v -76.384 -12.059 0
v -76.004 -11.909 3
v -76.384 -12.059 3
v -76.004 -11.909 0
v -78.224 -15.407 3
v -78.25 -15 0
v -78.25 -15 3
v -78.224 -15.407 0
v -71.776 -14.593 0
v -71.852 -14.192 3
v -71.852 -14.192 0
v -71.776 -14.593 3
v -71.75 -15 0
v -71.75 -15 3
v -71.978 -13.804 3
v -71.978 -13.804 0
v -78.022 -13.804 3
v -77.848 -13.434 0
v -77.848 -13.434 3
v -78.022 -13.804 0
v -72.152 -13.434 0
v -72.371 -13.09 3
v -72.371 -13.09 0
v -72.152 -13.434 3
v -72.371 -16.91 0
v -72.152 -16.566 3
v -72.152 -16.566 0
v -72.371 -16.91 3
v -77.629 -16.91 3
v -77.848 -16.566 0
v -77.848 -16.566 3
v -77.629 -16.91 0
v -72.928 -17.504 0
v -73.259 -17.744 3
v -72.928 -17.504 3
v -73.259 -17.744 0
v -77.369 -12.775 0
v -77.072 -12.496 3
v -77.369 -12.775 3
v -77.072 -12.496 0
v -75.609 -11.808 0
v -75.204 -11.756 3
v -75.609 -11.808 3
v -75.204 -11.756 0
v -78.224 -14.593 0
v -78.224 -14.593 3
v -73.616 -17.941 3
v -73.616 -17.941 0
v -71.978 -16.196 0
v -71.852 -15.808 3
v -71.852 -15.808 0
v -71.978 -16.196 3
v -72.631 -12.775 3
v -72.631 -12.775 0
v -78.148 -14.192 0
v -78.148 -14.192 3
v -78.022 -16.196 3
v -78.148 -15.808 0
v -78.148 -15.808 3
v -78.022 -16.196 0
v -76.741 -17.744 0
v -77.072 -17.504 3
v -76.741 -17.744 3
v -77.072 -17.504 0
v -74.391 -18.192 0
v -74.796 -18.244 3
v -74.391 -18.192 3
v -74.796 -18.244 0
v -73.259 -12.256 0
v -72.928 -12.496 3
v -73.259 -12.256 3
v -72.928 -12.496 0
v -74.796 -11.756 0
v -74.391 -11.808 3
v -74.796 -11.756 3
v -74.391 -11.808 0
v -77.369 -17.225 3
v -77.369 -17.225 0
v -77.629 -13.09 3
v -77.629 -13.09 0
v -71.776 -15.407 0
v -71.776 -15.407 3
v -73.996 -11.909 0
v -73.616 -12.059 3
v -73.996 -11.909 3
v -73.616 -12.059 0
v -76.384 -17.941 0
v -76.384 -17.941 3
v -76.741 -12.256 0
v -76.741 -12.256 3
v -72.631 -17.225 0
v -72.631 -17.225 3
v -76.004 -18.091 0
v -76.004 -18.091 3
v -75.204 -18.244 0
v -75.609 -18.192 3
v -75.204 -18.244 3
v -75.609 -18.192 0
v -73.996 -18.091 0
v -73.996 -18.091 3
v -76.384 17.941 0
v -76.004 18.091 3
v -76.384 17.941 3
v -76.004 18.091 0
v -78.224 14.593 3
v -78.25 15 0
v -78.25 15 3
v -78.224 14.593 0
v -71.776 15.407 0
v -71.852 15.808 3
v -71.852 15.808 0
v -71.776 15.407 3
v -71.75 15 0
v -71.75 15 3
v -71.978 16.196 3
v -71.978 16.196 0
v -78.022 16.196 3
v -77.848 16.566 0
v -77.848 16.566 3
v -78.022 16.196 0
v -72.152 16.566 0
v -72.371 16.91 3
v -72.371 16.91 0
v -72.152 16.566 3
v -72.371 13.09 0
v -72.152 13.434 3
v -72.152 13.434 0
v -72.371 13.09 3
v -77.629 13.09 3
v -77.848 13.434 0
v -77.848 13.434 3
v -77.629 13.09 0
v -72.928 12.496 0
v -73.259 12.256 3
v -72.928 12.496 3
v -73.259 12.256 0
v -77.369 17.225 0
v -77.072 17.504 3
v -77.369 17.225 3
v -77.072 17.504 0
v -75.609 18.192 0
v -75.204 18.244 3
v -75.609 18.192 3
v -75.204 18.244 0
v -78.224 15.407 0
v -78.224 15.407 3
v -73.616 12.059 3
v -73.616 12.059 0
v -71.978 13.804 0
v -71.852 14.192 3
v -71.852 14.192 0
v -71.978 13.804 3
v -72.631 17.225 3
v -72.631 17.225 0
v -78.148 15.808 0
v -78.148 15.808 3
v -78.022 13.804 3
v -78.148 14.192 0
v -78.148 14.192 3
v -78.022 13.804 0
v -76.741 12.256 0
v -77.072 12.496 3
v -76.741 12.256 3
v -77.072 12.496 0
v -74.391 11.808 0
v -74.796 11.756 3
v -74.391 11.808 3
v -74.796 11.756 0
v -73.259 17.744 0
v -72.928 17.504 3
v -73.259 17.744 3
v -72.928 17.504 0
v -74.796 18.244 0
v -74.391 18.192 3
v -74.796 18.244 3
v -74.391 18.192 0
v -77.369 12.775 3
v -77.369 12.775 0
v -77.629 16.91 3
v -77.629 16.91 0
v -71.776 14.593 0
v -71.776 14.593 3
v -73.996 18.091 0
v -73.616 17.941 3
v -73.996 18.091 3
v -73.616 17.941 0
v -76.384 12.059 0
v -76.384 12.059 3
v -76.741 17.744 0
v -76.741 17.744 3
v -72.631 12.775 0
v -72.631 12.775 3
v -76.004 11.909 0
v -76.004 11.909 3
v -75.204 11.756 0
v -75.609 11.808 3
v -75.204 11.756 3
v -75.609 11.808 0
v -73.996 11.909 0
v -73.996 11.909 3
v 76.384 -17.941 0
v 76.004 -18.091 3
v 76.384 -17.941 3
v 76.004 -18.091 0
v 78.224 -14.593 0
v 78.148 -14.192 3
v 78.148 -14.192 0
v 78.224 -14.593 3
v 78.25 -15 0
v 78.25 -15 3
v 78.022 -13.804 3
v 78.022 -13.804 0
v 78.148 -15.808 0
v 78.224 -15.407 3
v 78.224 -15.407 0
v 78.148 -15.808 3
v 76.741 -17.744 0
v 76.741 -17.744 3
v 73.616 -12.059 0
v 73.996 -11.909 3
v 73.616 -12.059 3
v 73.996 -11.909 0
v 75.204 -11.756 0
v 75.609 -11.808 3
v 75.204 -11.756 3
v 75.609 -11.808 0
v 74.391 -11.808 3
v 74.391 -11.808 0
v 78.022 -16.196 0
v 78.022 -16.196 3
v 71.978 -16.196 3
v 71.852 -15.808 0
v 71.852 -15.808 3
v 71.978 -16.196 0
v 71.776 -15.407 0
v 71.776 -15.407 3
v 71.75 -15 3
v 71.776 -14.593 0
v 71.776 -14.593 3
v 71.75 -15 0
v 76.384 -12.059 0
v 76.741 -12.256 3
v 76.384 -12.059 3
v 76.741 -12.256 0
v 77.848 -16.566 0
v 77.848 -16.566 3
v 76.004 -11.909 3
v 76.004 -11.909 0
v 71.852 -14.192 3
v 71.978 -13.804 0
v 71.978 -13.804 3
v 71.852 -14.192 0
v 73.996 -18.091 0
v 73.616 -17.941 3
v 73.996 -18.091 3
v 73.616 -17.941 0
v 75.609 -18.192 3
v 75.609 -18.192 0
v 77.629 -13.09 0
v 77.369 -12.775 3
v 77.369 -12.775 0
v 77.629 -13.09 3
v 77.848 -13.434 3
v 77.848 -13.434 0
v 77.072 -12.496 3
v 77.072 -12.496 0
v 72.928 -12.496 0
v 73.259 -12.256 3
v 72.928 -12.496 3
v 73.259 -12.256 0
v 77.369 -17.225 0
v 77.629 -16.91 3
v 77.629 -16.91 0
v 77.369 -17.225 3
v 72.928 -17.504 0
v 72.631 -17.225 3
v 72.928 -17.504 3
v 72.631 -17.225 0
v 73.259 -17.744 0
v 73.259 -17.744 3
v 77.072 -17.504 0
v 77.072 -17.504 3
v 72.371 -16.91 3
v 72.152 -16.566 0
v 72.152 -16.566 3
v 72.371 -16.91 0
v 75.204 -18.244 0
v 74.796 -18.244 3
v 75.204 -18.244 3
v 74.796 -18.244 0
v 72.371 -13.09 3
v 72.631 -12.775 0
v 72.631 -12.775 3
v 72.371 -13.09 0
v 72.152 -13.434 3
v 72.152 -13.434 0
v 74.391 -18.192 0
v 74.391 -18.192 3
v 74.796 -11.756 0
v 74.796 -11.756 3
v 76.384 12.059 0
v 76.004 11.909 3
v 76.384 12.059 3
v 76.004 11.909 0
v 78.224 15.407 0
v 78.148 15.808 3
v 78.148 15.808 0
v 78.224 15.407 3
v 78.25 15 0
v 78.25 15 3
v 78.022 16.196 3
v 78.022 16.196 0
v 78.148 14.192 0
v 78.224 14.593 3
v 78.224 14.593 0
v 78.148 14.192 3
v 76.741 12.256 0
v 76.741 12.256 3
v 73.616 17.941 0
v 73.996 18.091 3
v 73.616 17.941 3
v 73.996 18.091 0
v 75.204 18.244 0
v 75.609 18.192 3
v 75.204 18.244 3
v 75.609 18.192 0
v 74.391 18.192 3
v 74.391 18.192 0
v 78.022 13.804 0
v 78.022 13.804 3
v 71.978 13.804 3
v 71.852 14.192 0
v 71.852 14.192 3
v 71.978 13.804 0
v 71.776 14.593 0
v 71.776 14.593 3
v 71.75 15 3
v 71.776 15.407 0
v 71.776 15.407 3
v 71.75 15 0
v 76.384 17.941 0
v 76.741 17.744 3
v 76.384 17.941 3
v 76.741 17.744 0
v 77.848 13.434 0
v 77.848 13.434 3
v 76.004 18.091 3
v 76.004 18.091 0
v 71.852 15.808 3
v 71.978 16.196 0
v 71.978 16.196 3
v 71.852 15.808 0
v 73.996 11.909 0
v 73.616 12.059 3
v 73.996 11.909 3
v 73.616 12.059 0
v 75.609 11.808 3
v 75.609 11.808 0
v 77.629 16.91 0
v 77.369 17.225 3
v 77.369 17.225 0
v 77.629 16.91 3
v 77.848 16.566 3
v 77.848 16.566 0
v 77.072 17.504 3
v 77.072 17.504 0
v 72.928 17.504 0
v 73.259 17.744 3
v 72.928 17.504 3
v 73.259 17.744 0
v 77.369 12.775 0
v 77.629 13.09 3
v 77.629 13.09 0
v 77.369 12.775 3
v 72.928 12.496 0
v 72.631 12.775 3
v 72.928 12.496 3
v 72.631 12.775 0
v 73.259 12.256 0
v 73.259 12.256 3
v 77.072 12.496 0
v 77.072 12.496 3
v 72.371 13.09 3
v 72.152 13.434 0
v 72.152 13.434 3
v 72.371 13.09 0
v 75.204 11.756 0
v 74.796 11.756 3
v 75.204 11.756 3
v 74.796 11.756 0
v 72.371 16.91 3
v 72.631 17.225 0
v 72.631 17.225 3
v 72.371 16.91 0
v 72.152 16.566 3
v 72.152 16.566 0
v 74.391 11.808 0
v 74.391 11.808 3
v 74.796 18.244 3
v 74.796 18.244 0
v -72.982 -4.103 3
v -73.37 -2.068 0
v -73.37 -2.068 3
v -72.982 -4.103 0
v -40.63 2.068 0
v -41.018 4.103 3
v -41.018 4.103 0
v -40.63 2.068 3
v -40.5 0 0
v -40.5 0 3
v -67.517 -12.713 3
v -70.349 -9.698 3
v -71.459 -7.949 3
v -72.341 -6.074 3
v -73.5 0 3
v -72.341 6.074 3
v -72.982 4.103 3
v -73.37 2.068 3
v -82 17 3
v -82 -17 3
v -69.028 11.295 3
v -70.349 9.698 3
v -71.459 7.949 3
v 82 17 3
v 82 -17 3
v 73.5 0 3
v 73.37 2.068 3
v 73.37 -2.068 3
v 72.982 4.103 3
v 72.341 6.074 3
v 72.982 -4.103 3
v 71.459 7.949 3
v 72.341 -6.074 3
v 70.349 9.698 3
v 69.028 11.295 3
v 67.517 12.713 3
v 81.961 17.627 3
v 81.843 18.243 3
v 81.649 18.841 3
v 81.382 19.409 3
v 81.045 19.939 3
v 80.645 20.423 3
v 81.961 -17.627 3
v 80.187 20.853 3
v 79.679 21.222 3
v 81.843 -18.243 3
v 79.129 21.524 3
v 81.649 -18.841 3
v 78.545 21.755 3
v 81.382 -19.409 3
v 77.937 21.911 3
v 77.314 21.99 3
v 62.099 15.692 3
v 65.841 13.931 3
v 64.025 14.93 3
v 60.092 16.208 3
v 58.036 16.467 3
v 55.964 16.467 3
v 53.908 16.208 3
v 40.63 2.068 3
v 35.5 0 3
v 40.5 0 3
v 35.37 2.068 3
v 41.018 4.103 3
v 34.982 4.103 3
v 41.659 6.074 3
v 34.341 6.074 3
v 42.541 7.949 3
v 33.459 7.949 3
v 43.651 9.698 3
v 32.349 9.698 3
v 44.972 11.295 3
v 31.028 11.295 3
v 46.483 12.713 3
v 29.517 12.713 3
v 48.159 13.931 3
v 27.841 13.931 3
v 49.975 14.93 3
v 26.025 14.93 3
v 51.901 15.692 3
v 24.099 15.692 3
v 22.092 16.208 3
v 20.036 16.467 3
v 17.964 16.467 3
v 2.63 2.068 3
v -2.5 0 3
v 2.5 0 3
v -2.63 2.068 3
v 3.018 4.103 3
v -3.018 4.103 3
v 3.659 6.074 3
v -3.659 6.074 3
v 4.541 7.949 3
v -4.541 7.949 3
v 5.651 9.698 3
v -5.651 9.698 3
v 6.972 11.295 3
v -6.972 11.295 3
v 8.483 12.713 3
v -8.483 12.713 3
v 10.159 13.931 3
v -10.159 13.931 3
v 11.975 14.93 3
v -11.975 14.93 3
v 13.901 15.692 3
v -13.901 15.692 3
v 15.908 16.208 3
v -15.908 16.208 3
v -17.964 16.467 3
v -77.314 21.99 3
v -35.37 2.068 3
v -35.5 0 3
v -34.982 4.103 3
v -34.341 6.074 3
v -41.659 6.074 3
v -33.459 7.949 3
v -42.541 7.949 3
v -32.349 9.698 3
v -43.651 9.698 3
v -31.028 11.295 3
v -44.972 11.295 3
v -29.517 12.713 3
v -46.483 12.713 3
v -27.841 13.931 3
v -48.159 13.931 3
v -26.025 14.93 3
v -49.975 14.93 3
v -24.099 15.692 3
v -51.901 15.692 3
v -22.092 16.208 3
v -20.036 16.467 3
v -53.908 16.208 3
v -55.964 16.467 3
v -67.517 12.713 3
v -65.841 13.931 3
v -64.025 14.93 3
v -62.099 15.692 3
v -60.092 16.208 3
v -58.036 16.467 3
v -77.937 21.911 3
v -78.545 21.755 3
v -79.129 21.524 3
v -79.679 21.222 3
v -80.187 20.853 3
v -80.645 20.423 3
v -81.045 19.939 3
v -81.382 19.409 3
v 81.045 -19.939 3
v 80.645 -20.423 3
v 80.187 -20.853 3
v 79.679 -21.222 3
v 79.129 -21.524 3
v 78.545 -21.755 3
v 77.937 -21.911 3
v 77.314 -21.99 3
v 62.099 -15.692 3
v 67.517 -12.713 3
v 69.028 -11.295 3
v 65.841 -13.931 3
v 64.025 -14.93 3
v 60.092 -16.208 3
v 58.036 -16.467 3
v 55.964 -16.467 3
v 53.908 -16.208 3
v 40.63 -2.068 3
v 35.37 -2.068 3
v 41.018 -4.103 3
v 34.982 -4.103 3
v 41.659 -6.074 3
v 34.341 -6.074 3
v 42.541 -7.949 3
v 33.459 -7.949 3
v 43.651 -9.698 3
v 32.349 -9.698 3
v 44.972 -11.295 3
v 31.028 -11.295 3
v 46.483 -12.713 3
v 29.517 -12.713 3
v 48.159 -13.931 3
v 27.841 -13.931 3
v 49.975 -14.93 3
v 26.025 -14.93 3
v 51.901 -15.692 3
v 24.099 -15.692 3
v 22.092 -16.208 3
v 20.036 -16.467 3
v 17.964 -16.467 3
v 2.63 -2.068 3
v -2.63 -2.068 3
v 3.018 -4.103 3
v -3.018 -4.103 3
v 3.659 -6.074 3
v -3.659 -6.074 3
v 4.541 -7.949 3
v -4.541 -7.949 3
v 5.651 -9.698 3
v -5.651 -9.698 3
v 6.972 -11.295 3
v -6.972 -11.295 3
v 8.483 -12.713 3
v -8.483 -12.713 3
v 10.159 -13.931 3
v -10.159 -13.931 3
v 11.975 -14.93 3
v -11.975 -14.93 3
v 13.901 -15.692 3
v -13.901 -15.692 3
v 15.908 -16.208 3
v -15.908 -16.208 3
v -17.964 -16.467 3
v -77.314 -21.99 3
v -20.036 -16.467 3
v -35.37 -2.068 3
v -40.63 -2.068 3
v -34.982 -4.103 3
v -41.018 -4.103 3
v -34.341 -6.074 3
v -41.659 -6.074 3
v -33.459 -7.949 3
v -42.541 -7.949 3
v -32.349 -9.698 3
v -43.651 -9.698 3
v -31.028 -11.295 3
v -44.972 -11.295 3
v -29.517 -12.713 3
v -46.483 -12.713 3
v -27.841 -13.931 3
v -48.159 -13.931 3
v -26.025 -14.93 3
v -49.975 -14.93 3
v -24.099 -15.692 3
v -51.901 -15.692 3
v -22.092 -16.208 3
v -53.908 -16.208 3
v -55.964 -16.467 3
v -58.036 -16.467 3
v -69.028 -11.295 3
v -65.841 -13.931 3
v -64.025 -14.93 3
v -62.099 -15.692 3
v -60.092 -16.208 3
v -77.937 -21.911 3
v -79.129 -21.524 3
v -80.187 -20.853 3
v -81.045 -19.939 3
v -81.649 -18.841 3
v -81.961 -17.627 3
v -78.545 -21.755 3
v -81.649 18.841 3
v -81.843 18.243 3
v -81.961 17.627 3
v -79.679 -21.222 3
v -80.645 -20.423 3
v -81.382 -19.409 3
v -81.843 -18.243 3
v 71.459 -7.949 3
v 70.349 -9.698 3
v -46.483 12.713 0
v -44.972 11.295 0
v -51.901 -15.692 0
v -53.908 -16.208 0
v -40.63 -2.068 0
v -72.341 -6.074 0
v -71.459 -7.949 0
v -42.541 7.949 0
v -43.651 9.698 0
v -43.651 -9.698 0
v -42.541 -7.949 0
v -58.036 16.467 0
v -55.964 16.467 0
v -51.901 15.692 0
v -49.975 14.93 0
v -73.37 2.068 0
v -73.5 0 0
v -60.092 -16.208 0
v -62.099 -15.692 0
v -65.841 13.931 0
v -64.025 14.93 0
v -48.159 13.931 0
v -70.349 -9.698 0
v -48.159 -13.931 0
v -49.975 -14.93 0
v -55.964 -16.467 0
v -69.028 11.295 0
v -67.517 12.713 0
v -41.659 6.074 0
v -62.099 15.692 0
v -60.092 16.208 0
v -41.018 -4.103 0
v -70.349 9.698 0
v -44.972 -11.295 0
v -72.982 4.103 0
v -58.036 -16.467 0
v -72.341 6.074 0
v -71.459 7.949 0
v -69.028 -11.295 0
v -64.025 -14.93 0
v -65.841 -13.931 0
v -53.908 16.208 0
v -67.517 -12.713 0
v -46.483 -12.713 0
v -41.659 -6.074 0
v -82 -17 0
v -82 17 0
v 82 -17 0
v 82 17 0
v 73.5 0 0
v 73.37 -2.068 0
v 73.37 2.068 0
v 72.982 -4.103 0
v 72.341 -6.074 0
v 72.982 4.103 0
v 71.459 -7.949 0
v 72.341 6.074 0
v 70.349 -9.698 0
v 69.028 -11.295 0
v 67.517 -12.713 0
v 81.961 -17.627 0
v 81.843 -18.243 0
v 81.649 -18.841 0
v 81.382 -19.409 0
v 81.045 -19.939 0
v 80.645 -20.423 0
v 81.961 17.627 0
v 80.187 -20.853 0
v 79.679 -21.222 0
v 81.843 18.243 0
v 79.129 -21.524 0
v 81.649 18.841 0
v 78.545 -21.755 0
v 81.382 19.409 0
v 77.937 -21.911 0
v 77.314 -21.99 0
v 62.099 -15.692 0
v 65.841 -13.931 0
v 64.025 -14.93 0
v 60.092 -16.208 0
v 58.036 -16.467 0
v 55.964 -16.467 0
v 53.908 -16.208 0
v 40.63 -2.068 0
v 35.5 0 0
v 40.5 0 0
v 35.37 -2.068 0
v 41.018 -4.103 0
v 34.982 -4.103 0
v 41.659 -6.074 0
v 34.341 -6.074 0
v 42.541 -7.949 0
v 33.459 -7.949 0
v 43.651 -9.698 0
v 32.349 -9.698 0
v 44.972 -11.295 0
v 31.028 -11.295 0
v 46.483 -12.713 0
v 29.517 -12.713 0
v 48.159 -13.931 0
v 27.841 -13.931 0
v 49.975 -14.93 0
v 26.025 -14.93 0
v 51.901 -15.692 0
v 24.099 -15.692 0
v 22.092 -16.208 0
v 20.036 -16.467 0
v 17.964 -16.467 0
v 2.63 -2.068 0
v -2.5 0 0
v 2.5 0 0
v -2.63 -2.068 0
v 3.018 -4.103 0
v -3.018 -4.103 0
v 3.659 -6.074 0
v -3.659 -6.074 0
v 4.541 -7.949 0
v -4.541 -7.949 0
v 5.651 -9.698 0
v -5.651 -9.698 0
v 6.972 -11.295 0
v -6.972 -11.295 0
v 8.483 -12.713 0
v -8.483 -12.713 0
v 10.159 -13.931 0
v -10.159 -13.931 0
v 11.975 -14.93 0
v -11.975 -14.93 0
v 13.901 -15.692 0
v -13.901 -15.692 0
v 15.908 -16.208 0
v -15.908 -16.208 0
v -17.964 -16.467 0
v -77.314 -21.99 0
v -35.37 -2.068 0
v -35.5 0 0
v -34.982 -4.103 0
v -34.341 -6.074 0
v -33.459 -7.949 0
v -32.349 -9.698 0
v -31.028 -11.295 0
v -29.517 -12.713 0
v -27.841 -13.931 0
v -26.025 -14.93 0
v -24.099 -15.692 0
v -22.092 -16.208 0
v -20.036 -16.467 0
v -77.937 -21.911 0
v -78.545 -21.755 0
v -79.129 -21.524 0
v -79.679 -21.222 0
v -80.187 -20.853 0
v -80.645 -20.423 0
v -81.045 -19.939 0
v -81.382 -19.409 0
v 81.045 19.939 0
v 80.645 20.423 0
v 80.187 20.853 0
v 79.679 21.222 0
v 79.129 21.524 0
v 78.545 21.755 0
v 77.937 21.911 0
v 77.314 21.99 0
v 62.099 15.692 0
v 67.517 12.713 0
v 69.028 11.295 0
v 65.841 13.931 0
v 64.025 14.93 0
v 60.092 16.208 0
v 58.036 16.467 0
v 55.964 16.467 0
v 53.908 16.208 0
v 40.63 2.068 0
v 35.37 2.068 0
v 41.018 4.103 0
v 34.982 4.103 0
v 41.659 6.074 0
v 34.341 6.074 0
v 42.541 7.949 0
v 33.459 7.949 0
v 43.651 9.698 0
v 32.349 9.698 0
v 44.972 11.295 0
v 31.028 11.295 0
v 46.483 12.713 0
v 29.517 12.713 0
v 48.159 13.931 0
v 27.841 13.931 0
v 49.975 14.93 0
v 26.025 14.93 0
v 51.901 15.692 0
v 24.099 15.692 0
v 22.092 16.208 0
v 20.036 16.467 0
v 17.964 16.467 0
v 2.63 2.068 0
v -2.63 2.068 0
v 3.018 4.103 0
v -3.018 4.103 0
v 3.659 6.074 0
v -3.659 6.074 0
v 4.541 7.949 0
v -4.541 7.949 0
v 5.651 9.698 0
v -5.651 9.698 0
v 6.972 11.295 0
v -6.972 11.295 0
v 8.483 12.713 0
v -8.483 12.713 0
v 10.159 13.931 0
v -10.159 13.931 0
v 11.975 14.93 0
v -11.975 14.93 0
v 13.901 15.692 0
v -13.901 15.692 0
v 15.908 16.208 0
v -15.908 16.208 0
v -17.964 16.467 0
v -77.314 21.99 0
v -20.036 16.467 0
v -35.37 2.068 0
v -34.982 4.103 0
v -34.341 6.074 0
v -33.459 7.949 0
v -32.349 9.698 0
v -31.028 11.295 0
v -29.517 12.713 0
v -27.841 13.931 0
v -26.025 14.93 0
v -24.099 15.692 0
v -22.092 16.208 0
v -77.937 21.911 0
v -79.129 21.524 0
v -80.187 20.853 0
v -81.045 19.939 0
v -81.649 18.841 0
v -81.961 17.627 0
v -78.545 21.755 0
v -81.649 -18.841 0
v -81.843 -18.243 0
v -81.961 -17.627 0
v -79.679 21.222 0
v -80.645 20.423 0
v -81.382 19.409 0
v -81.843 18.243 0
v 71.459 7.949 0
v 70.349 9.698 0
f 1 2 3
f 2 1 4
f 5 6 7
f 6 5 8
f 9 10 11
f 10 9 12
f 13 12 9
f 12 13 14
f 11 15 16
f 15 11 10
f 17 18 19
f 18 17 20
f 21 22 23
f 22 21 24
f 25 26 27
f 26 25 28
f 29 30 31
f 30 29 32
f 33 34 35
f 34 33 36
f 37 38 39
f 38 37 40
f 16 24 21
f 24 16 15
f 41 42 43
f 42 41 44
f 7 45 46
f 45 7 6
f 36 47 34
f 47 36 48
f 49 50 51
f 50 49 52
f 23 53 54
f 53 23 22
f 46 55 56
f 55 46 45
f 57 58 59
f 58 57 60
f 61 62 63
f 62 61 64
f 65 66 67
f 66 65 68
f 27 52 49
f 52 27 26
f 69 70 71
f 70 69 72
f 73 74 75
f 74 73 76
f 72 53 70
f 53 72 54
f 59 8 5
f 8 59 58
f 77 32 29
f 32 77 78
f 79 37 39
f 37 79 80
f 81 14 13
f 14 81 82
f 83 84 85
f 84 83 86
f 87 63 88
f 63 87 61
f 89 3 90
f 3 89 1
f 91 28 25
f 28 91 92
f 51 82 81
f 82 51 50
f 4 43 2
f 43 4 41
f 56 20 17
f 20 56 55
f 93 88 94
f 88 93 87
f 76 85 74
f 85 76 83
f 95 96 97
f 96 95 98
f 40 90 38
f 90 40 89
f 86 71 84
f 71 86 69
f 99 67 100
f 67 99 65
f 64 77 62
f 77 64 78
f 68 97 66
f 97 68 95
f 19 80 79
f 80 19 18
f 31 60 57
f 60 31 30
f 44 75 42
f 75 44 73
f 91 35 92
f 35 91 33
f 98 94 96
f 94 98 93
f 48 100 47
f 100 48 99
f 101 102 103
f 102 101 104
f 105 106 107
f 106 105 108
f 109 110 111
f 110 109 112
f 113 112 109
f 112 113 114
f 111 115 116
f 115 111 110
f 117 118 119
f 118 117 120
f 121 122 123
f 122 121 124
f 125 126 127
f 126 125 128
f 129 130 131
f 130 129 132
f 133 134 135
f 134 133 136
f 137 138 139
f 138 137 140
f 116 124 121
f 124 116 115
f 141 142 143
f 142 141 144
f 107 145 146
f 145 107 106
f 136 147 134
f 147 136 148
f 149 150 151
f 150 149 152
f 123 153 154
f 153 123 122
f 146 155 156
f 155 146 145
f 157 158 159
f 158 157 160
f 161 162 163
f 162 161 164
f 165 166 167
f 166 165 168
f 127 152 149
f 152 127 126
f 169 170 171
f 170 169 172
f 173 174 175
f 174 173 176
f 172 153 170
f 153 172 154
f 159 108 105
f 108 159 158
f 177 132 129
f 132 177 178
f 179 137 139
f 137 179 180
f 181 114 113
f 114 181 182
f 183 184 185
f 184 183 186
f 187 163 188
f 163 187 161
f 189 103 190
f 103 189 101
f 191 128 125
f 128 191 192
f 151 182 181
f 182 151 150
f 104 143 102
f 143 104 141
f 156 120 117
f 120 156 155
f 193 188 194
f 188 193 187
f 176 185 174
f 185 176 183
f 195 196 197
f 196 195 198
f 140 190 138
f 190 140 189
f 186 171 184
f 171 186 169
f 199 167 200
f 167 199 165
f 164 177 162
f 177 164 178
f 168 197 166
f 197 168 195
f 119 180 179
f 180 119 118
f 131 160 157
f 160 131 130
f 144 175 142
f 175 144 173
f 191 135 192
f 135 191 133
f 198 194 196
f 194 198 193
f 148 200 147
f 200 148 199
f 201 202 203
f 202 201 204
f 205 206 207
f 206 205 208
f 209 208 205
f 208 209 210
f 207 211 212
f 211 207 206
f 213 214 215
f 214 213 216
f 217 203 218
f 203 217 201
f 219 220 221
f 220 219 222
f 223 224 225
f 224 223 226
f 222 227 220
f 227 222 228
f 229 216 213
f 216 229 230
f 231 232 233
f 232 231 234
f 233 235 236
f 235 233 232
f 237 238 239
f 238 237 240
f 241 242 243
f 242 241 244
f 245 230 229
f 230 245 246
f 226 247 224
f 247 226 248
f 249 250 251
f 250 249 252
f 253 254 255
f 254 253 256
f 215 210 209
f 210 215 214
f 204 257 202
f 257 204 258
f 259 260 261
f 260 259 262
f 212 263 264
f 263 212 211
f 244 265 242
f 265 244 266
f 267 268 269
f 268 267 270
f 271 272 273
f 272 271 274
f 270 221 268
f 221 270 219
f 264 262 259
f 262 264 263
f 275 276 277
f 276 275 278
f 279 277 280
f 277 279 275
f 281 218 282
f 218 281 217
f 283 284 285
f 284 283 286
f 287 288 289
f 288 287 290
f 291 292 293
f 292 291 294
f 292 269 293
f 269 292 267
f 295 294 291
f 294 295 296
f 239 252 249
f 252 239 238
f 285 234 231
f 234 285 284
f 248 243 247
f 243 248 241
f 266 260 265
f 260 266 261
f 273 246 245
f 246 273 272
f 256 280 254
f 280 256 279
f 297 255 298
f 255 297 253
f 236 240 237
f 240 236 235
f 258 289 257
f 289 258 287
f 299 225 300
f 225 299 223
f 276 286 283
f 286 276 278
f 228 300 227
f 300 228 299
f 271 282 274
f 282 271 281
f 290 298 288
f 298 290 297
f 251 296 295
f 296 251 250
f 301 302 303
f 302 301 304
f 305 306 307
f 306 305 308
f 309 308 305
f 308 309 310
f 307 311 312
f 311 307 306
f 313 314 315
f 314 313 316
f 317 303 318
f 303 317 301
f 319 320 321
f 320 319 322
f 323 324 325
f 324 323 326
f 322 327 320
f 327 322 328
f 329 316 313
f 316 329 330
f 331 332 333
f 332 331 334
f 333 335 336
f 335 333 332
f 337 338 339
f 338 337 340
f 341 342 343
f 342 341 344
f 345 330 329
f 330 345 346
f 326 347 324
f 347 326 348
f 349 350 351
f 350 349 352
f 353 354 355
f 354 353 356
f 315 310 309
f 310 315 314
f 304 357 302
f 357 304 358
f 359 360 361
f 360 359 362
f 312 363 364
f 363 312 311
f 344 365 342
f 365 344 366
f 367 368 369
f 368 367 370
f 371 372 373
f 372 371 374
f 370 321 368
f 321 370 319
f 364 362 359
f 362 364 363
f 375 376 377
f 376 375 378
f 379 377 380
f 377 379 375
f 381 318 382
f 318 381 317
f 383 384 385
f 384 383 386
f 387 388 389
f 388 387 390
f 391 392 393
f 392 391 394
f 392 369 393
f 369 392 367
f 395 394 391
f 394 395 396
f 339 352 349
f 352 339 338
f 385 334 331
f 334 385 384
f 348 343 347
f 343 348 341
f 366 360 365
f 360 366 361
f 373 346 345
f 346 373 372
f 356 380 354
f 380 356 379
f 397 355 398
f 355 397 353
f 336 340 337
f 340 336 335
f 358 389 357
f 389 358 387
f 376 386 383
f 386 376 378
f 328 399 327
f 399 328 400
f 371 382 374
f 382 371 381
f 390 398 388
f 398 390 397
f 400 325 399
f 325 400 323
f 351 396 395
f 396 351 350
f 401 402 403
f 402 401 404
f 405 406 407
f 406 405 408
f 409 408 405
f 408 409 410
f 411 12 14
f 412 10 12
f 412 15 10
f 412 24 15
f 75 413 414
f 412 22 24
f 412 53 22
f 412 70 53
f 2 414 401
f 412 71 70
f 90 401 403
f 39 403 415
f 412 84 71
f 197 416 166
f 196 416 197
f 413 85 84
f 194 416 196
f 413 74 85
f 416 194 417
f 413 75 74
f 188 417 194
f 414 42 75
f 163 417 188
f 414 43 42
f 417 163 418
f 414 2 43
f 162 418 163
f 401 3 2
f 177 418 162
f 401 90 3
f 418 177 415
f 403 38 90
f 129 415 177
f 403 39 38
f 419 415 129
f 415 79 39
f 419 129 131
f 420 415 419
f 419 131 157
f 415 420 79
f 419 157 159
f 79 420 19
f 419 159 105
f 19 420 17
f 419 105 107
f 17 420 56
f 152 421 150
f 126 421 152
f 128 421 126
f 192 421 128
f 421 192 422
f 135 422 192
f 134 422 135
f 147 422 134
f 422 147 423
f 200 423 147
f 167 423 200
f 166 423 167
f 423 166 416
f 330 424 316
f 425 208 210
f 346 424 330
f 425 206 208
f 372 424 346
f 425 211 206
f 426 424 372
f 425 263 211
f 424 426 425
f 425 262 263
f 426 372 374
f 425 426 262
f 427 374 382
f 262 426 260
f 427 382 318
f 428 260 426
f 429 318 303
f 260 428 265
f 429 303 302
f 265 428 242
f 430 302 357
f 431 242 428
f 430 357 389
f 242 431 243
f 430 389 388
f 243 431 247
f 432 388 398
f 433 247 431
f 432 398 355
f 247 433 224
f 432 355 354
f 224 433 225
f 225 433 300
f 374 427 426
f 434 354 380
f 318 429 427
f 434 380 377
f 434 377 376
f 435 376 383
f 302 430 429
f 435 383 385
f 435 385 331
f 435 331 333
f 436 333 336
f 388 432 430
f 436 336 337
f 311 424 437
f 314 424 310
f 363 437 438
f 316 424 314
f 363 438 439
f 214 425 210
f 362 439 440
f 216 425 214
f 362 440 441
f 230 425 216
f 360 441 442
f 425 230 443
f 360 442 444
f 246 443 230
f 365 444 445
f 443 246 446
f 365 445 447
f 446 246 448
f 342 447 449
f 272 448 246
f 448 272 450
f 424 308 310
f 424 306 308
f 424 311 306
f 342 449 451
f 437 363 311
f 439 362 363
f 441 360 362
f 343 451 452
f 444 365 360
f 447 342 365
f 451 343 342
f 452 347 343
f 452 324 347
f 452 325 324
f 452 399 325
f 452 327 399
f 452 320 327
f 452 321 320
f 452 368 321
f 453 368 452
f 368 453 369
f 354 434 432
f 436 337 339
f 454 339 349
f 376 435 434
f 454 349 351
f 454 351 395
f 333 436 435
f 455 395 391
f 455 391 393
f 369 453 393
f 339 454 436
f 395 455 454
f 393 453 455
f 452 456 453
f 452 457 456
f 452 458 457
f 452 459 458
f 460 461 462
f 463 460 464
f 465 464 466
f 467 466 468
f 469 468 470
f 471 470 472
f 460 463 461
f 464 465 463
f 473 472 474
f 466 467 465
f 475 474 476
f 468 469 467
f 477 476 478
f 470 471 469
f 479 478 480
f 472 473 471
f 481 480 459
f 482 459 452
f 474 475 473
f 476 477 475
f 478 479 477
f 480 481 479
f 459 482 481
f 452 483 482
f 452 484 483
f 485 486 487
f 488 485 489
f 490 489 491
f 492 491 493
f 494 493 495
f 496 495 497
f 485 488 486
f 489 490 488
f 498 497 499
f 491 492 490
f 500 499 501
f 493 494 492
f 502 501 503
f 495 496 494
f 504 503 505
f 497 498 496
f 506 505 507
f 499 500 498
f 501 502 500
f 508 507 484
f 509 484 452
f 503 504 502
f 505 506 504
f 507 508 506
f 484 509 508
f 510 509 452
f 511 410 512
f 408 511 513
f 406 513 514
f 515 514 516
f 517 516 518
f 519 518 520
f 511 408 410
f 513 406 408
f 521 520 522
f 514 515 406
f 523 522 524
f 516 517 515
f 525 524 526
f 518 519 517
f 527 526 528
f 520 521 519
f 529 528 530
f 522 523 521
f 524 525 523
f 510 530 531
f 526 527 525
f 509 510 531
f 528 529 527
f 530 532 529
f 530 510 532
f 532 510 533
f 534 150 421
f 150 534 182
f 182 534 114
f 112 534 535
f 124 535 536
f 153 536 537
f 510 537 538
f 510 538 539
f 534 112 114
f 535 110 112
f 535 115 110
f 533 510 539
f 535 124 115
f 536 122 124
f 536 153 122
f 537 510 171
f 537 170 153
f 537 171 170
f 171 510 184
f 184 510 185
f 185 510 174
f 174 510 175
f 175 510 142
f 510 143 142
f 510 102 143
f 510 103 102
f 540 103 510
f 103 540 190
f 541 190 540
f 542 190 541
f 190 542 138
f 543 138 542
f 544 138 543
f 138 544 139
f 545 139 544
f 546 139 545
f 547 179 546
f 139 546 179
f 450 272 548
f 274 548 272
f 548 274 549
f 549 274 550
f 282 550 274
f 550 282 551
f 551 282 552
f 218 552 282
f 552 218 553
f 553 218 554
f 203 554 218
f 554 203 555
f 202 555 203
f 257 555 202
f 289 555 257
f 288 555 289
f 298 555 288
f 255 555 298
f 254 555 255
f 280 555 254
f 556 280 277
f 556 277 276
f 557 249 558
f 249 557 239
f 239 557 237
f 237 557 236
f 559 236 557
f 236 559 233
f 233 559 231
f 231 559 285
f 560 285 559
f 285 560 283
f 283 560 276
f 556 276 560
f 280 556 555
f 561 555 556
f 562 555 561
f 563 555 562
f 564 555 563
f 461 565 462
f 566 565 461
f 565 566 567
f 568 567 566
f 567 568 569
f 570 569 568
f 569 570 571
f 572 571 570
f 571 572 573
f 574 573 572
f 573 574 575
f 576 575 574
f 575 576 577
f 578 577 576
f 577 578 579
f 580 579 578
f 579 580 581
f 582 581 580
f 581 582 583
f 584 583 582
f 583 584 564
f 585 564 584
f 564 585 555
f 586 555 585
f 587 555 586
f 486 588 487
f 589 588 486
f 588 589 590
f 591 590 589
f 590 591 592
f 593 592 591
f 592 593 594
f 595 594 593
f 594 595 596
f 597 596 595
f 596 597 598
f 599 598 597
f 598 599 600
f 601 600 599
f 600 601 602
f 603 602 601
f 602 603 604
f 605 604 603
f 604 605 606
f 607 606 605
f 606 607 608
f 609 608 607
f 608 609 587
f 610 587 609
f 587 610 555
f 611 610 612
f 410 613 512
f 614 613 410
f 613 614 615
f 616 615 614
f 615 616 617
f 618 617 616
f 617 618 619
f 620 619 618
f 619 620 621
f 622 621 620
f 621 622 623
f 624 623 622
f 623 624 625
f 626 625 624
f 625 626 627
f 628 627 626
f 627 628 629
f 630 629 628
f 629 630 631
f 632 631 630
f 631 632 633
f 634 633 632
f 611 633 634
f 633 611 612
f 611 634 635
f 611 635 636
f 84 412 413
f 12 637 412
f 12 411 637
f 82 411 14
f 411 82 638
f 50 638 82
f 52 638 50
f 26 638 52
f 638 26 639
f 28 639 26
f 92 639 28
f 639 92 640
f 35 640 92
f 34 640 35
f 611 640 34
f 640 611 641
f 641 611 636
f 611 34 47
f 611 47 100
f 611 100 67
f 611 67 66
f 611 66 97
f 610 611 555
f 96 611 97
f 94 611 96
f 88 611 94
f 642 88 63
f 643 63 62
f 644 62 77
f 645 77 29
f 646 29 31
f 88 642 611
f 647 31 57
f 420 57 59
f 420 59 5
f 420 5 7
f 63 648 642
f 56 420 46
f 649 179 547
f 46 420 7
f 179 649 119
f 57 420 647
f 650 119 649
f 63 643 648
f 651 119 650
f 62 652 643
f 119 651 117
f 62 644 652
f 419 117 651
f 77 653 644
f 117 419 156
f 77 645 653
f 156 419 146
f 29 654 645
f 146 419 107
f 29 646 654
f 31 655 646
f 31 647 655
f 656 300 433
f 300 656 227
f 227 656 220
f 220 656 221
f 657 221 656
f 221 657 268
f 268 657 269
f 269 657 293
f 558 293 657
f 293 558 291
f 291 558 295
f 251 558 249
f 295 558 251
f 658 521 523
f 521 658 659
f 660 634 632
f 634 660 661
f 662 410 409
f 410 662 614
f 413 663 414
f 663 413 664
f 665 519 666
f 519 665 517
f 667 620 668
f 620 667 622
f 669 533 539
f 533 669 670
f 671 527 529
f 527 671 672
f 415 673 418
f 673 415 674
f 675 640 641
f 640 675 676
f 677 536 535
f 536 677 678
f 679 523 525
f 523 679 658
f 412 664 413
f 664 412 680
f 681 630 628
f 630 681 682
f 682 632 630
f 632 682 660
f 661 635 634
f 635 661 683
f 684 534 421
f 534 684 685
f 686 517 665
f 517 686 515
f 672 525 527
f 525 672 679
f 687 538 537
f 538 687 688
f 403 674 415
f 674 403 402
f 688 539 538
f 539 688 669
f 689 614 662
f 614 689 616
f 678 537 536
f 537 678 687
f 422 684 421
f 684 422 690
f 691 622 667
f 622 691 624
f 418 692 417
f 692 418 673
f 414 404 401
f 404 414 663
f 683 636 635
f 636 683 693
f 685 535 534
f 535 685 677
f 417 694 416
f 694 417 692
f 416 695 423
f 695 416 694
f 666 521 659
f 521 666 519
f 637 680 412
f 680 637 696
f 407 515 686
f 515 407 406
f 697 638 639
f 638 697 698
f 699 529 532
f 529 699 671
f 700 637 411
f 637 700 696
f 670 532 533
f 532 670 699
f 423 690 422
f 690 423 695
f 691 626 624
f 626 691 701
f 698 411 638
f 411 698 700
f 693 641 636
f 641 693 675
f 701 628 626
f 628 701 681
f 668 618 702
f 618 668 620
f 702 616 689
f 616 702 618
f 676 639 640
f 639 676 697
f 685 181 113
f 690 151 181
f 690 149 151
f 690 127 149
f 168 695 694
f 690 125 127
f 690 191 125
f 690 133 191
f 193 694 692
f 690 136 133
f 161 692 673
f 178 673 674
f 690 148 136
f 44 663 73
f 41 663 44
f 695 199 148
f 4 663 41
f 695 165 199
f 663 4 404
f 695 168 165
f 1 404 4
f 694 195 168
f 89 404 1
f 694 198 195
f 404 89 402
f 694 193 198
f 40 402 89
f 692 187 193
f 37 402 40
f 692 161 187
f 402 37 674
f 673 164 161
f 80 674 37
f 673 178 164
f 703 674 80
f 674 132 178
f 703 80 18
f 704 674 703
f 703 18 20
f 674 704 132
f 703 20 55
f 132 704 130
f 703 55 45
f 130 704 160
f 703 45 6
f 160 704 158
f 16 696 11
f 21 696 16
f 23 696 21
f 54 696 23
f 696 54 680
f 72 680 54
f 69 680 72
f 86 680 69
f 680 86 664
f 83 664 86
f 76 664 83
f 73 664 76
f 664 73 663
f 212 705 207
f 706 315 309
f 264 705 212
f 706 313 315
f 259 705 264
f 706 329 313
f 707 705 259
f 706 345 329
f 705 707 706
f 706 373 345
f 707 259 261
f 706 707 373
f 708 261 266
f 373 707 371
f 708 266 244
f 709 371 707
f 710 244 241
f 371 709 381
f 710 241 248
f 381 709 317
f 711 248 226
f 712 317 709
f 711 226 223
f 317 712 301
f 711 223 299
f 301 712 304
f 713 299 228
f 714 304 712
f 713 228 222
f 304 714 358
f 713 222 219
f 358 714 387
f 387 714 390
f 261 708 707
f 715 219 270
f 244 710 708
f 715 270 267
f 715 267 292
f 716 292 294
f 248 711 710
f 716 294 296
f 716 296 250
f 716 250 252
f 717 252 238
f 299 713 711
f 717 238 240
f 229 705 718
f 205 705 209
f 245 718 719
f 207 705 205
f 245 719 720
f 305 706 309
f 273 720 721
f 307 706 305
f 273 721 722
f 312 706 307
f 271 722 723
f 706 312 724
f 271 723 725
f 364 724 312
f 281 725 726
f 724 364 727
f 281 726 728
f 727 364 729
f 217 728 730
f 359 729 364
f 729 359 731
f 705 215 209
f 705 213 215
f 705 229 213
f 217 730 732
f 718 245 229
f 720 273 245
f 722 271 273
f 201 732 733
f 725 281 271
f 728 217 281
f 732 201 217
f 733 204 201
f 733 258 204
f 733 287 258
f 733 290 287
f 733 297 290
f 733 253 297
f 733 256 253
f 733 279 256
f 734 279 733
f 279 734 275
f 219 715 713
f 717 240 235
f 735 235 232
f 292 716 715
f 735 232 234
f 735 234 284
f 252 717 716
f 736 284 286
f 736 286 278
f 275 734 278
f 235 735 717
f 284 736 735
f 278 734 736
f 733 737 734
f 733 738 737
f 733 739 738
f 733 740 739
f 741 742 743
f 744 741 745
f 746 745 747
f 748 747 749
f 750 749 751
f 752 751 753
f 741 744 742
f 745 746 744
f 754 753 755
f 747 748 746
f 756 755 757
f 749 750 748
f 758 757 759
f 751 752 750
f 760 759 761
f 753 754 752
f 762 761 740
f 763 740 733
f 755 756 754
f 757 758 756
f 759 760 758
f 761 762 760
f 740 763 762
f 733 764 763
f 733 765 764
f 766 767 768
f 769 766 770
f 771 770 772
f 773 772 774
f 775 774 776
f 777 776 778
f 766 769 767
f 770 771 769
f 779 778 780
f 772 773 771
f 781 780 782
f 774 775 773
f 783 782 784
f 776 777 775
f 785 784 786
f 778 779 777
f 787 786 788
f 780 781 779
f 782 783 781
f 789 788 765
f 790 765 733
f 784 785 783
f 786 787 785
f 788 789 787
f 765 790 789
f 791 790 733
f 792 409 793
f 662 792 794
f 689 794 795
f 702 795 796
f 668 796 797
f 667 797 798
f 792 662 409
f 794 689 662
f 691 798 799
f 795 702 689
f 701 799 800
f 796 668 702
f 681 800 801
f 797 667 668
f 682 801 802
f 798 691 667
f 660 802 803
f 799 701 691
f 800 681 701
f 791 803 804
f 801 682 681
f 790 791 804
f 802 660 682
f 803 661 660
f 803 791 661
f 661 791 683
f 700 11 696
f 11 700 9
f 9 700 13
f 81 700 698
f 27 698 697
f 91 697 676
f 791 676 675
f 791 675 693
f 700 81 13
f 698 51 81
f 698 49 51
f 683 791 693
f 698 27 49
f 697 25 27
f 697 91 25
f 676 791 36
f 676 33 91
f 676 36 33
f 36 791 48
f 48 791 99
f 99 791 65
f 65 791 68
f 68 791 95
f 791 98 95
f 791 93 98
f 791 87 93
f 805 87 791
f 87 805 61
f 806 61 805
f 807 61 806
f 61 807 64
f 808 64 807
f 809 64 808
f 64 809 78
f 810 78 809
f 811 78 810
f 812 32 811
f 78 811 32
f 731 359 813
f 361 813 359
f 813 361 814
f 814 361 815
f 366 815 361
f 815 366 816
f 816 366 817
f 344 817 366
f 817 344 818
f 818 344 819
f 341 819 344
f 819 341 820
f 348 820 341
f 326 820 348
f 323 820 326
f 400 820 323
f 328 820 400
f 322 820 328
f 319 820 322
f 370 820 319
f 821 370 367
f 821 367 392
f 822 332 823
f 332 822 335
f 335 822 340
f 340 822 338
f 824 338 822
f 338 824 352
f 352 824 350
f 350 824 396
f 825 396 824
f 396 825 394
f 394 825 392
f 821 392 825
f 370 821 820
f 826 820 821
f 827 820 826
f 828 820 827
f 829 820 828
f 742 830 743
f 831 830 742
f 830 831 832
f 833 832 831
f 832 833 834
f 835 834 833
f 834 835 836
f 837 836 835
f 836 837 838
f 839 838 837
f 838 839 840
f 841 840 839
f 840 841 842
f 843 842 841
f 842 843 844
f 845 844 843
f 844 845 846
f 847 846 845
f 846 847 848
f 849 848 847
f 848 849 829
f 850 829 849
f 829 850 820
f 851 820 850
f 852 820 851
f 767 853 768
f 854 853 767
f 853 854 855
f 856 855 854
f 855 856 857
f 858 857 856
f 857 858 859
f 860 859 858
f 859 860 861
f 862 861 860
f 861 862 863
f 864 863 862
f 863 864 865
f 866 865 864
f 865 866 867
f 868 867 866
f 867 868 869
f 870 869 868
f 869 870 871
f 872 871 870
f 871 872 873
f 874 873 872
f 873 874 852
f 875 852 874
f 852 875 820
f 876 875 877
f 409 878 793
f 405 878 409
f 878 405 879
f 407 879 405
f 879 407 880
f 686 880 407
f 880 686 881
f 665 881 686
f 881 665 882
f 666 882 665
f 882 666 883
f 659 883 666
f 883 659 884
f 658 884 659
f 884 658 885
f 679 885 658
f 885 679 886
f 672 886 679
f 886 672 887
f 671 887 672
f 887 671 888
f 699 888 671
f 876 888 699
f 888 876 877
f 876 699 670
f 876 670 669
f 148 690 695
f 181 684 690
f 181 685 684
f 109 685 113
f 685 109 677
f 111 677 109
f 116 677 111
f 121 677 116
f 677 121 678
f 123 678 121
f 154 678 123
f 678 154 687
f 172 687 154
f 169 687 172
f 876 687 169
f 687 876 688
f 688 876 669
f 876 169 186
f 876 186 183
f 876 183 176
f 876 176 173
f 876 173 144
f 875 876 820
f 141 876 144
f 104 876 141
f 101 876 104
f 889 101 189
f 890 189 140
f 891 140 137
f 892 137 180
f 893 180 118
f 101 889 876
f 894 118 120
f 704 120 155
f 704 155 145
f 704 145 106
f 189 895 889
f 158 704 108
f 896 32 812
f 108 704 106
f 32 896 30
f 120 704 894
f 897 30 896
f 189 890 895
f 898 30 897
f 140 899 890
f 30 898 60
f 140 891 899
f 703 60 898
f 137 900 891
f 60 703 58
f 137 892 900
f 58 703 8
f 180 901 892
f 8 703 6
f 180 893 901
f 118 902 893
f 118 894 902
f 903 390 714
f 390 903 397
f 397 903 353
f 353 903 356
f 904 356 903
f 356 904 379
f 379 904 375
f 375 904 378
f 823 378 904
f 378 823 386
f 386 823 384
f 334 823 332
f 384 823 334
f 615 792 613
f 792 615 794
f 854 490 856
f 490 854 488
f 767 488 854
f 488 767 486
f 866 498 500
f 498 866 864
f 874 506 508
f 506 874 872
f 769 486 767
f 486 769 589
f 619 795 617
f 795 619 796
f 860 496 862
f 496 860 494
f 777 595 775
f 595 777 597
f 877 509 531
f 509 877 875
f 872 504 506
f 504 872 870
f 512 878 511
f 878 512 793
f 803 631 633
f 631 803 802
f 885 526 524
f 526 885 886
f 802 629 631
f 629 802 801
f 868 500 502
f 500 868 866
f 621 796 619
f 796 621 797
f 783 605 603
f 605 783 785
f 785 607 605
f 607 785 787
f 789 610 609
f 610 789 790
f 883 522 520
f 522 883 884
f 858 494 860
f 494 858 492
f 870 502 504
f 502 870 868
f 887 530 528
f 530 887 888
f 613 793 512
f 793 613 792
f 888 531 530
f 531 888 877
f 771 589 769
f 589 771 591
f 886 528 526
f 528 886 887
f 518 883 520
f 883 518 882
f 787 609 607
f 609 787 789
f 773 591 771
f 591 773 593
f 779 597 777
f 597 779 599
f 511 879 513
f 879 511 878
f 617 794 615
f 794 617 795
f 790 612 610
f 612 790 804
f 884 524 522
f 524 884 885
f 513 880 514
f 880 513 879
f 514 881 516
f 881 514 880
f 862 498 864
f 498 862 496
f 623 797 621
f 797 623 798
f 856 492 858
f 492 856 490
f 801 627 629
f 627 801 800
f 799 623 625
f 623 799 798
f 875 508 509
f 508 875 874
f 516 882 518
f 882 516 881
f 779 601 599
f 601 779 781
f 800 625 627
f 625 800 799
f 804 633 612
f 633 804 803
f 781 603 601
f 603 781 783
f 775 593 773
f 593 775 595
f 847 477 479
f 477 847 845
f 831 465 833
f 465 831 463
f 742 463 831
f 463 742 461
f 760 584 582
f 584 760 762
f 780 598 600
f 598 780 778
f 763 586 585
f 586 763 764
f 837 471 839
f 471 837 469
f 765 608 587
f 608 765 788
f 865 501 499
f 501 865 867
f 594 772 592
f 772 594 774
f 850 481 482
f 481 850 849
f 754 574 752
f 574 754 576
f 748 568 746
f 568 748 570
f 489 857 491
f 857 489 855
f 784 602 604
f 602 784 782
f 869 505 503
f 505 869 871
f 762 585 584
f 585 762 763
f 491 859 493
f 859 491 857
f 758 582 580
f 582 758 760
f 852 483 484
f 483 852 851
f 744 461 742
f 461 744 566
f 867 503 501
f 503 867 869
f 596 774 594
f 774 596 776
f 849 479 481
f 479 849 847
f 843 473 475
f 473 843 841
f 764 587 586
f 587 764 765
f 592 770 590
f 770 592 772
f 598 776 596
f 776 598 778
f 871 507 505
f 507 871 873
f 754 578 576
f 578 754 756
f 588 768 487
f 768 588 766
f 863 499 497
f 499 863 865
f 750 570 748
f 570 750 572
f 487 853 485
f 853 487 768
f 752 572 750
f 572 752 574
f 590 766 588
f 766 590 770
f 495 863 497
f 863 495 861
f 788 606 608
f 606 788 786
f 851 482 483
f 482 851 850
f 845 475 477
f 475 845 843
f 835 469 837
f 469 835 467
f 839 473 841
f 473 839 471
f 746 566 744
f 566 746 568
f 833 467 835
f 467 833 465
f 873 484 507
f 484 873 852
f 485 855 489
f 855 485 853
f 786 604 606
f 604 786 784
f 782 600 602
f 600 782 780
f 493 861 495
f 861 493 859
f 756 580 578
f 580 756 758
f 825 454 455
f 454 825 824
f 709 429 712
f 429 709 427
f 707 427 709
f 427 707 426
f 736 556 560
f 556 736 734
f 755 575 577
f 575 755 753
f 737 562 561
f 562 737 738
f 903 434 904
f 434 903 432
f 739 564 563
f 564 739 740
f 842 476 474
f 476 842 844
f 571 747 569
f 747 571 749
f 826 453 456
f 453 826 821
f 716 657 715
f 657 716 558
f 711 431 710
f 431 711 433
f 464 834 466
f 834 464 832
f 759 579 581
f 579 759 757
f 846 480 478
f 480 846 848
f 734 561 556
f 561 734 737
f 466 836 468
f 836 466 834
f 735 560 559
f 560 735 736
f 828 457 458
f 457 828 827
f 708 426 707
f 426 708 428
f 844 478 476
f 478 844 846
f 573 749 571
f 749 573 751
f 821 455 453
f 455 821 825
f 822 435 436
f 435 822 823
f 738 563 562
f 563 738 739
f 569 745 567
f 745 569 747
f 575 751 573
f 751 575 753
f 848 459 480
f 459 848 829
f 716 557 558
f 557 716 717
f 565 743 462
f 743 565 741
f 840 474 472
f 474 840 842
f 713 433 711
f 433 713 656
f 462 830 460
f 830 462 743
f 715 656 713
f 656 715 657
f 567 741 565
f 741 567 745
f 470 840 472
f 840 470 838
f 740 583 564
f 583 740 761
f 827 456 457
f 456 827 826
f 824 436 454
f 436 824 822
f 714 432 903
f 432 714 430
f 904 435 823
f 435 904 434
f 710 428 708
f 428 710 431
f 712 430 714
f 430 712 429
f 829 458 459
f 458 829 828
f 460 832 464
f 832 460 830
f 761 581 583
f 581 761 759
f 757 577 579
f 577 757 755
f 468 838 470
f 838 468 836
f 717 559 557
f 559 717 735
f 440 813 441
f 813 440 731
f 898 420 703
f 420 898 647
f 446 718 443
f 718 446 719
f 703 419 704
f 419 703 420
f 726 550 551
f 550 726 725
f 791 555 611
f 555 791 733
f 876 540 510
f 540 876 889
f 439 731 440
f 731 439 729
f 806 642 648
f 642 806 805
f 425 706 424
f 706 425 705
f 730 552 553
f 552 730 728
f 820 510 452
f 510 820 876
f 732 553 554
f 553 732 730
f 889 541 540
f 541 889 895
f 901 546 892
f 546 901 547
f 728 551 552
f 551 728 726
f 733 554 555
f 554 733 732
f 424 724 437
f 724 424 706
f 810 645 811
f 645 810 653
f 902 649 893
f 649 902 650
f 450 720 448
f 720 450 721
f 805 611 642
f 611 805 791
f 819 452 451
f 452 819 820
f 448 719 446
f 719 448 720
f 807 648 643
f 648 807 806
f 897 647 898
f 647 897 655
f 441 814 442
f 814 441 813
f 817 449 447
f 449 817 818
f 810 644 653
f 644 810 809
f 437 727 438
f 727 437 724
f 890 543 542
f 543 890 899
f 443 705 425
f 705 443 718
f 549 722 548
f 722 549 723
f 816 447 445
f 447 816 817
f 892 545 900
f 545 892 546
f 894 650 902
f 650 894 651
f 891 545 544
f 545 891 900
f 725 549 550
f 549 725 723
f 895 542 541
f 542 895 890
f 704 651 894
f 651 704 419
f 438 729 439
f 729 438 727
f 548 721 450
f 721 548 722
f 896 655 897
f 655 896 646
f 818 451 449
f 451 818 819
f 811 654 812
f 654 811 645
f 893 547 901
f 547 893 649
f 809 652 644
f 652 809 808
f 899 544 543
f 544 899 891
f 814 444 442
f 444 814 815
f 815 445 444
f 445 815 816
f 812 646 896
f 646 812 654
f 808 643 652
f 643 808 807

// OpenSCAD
$fn = 50;

difference() {
	union() {
		hull() {
			translate(v = [-77.0, 17.0, 0]) {
				cylinder(h = 3, r = 5);
			}
			translate(v = [77.0, 17.0, 0]) {
				cylinder(h = 3, r = 5);
			}
			translate(v = [-77.0, -17.0, 0]) {
				cylinder(h = 3, r = 5);
			}
			translate(v = [77.0, -17.0, 0]) {
				cylinder(h = 3, r = 5);
			}
		}
	}
	union() {
		translate(v = [-75.0, -15.0, -100.0]) {
			cylinder(h = 200, r = 3.25);
		}
		translate(v = [-75.0, 15.0, -100.0]) {
			cylinder(h = 200, r = 3.25);
		}
		translate(v = [75.0, -15.0, -100.0]) {
			cylinder(h = 200, r = 3.25);
		}
		translate(v = [75.0, 15.0, -100.0]) {
			cylinder(h = 200, r = 3.25);
		}
		translate(v = [-75.0, -15.0, -100.0]) {
			cylinder(h = 200, r = 1.8);
		}
		translate(v = [-75.0, 15.0, -100.0]) {
			cylinder(h = 200, r = 1.8);
		}
		translate(v = [75.0, -15.0, -100.0]) {
			cylinder(h = 200, r = 1.8);
		}
		translate(v = [75.0, 15.0, -100.0]) {
			cylinder(h = 200, r = 1.8);
		}
		translate(v = [-57.0, 0, 0.0]) {
			cylinder(h = 3, r = 16.5);
		}
		translate(v = [-19.0, 0, 0.0]) {
			cylinder(h = 3, r = 16.5);
		}
		translate(v = [19.0, 0, 0.0]) {
			cylinder(h = 3, r = 16.5);
		}
		translate(v = [57.0, 0, 0.0]) {
			cylinder(h = 3, r = 16.5);
		}
	}
}
